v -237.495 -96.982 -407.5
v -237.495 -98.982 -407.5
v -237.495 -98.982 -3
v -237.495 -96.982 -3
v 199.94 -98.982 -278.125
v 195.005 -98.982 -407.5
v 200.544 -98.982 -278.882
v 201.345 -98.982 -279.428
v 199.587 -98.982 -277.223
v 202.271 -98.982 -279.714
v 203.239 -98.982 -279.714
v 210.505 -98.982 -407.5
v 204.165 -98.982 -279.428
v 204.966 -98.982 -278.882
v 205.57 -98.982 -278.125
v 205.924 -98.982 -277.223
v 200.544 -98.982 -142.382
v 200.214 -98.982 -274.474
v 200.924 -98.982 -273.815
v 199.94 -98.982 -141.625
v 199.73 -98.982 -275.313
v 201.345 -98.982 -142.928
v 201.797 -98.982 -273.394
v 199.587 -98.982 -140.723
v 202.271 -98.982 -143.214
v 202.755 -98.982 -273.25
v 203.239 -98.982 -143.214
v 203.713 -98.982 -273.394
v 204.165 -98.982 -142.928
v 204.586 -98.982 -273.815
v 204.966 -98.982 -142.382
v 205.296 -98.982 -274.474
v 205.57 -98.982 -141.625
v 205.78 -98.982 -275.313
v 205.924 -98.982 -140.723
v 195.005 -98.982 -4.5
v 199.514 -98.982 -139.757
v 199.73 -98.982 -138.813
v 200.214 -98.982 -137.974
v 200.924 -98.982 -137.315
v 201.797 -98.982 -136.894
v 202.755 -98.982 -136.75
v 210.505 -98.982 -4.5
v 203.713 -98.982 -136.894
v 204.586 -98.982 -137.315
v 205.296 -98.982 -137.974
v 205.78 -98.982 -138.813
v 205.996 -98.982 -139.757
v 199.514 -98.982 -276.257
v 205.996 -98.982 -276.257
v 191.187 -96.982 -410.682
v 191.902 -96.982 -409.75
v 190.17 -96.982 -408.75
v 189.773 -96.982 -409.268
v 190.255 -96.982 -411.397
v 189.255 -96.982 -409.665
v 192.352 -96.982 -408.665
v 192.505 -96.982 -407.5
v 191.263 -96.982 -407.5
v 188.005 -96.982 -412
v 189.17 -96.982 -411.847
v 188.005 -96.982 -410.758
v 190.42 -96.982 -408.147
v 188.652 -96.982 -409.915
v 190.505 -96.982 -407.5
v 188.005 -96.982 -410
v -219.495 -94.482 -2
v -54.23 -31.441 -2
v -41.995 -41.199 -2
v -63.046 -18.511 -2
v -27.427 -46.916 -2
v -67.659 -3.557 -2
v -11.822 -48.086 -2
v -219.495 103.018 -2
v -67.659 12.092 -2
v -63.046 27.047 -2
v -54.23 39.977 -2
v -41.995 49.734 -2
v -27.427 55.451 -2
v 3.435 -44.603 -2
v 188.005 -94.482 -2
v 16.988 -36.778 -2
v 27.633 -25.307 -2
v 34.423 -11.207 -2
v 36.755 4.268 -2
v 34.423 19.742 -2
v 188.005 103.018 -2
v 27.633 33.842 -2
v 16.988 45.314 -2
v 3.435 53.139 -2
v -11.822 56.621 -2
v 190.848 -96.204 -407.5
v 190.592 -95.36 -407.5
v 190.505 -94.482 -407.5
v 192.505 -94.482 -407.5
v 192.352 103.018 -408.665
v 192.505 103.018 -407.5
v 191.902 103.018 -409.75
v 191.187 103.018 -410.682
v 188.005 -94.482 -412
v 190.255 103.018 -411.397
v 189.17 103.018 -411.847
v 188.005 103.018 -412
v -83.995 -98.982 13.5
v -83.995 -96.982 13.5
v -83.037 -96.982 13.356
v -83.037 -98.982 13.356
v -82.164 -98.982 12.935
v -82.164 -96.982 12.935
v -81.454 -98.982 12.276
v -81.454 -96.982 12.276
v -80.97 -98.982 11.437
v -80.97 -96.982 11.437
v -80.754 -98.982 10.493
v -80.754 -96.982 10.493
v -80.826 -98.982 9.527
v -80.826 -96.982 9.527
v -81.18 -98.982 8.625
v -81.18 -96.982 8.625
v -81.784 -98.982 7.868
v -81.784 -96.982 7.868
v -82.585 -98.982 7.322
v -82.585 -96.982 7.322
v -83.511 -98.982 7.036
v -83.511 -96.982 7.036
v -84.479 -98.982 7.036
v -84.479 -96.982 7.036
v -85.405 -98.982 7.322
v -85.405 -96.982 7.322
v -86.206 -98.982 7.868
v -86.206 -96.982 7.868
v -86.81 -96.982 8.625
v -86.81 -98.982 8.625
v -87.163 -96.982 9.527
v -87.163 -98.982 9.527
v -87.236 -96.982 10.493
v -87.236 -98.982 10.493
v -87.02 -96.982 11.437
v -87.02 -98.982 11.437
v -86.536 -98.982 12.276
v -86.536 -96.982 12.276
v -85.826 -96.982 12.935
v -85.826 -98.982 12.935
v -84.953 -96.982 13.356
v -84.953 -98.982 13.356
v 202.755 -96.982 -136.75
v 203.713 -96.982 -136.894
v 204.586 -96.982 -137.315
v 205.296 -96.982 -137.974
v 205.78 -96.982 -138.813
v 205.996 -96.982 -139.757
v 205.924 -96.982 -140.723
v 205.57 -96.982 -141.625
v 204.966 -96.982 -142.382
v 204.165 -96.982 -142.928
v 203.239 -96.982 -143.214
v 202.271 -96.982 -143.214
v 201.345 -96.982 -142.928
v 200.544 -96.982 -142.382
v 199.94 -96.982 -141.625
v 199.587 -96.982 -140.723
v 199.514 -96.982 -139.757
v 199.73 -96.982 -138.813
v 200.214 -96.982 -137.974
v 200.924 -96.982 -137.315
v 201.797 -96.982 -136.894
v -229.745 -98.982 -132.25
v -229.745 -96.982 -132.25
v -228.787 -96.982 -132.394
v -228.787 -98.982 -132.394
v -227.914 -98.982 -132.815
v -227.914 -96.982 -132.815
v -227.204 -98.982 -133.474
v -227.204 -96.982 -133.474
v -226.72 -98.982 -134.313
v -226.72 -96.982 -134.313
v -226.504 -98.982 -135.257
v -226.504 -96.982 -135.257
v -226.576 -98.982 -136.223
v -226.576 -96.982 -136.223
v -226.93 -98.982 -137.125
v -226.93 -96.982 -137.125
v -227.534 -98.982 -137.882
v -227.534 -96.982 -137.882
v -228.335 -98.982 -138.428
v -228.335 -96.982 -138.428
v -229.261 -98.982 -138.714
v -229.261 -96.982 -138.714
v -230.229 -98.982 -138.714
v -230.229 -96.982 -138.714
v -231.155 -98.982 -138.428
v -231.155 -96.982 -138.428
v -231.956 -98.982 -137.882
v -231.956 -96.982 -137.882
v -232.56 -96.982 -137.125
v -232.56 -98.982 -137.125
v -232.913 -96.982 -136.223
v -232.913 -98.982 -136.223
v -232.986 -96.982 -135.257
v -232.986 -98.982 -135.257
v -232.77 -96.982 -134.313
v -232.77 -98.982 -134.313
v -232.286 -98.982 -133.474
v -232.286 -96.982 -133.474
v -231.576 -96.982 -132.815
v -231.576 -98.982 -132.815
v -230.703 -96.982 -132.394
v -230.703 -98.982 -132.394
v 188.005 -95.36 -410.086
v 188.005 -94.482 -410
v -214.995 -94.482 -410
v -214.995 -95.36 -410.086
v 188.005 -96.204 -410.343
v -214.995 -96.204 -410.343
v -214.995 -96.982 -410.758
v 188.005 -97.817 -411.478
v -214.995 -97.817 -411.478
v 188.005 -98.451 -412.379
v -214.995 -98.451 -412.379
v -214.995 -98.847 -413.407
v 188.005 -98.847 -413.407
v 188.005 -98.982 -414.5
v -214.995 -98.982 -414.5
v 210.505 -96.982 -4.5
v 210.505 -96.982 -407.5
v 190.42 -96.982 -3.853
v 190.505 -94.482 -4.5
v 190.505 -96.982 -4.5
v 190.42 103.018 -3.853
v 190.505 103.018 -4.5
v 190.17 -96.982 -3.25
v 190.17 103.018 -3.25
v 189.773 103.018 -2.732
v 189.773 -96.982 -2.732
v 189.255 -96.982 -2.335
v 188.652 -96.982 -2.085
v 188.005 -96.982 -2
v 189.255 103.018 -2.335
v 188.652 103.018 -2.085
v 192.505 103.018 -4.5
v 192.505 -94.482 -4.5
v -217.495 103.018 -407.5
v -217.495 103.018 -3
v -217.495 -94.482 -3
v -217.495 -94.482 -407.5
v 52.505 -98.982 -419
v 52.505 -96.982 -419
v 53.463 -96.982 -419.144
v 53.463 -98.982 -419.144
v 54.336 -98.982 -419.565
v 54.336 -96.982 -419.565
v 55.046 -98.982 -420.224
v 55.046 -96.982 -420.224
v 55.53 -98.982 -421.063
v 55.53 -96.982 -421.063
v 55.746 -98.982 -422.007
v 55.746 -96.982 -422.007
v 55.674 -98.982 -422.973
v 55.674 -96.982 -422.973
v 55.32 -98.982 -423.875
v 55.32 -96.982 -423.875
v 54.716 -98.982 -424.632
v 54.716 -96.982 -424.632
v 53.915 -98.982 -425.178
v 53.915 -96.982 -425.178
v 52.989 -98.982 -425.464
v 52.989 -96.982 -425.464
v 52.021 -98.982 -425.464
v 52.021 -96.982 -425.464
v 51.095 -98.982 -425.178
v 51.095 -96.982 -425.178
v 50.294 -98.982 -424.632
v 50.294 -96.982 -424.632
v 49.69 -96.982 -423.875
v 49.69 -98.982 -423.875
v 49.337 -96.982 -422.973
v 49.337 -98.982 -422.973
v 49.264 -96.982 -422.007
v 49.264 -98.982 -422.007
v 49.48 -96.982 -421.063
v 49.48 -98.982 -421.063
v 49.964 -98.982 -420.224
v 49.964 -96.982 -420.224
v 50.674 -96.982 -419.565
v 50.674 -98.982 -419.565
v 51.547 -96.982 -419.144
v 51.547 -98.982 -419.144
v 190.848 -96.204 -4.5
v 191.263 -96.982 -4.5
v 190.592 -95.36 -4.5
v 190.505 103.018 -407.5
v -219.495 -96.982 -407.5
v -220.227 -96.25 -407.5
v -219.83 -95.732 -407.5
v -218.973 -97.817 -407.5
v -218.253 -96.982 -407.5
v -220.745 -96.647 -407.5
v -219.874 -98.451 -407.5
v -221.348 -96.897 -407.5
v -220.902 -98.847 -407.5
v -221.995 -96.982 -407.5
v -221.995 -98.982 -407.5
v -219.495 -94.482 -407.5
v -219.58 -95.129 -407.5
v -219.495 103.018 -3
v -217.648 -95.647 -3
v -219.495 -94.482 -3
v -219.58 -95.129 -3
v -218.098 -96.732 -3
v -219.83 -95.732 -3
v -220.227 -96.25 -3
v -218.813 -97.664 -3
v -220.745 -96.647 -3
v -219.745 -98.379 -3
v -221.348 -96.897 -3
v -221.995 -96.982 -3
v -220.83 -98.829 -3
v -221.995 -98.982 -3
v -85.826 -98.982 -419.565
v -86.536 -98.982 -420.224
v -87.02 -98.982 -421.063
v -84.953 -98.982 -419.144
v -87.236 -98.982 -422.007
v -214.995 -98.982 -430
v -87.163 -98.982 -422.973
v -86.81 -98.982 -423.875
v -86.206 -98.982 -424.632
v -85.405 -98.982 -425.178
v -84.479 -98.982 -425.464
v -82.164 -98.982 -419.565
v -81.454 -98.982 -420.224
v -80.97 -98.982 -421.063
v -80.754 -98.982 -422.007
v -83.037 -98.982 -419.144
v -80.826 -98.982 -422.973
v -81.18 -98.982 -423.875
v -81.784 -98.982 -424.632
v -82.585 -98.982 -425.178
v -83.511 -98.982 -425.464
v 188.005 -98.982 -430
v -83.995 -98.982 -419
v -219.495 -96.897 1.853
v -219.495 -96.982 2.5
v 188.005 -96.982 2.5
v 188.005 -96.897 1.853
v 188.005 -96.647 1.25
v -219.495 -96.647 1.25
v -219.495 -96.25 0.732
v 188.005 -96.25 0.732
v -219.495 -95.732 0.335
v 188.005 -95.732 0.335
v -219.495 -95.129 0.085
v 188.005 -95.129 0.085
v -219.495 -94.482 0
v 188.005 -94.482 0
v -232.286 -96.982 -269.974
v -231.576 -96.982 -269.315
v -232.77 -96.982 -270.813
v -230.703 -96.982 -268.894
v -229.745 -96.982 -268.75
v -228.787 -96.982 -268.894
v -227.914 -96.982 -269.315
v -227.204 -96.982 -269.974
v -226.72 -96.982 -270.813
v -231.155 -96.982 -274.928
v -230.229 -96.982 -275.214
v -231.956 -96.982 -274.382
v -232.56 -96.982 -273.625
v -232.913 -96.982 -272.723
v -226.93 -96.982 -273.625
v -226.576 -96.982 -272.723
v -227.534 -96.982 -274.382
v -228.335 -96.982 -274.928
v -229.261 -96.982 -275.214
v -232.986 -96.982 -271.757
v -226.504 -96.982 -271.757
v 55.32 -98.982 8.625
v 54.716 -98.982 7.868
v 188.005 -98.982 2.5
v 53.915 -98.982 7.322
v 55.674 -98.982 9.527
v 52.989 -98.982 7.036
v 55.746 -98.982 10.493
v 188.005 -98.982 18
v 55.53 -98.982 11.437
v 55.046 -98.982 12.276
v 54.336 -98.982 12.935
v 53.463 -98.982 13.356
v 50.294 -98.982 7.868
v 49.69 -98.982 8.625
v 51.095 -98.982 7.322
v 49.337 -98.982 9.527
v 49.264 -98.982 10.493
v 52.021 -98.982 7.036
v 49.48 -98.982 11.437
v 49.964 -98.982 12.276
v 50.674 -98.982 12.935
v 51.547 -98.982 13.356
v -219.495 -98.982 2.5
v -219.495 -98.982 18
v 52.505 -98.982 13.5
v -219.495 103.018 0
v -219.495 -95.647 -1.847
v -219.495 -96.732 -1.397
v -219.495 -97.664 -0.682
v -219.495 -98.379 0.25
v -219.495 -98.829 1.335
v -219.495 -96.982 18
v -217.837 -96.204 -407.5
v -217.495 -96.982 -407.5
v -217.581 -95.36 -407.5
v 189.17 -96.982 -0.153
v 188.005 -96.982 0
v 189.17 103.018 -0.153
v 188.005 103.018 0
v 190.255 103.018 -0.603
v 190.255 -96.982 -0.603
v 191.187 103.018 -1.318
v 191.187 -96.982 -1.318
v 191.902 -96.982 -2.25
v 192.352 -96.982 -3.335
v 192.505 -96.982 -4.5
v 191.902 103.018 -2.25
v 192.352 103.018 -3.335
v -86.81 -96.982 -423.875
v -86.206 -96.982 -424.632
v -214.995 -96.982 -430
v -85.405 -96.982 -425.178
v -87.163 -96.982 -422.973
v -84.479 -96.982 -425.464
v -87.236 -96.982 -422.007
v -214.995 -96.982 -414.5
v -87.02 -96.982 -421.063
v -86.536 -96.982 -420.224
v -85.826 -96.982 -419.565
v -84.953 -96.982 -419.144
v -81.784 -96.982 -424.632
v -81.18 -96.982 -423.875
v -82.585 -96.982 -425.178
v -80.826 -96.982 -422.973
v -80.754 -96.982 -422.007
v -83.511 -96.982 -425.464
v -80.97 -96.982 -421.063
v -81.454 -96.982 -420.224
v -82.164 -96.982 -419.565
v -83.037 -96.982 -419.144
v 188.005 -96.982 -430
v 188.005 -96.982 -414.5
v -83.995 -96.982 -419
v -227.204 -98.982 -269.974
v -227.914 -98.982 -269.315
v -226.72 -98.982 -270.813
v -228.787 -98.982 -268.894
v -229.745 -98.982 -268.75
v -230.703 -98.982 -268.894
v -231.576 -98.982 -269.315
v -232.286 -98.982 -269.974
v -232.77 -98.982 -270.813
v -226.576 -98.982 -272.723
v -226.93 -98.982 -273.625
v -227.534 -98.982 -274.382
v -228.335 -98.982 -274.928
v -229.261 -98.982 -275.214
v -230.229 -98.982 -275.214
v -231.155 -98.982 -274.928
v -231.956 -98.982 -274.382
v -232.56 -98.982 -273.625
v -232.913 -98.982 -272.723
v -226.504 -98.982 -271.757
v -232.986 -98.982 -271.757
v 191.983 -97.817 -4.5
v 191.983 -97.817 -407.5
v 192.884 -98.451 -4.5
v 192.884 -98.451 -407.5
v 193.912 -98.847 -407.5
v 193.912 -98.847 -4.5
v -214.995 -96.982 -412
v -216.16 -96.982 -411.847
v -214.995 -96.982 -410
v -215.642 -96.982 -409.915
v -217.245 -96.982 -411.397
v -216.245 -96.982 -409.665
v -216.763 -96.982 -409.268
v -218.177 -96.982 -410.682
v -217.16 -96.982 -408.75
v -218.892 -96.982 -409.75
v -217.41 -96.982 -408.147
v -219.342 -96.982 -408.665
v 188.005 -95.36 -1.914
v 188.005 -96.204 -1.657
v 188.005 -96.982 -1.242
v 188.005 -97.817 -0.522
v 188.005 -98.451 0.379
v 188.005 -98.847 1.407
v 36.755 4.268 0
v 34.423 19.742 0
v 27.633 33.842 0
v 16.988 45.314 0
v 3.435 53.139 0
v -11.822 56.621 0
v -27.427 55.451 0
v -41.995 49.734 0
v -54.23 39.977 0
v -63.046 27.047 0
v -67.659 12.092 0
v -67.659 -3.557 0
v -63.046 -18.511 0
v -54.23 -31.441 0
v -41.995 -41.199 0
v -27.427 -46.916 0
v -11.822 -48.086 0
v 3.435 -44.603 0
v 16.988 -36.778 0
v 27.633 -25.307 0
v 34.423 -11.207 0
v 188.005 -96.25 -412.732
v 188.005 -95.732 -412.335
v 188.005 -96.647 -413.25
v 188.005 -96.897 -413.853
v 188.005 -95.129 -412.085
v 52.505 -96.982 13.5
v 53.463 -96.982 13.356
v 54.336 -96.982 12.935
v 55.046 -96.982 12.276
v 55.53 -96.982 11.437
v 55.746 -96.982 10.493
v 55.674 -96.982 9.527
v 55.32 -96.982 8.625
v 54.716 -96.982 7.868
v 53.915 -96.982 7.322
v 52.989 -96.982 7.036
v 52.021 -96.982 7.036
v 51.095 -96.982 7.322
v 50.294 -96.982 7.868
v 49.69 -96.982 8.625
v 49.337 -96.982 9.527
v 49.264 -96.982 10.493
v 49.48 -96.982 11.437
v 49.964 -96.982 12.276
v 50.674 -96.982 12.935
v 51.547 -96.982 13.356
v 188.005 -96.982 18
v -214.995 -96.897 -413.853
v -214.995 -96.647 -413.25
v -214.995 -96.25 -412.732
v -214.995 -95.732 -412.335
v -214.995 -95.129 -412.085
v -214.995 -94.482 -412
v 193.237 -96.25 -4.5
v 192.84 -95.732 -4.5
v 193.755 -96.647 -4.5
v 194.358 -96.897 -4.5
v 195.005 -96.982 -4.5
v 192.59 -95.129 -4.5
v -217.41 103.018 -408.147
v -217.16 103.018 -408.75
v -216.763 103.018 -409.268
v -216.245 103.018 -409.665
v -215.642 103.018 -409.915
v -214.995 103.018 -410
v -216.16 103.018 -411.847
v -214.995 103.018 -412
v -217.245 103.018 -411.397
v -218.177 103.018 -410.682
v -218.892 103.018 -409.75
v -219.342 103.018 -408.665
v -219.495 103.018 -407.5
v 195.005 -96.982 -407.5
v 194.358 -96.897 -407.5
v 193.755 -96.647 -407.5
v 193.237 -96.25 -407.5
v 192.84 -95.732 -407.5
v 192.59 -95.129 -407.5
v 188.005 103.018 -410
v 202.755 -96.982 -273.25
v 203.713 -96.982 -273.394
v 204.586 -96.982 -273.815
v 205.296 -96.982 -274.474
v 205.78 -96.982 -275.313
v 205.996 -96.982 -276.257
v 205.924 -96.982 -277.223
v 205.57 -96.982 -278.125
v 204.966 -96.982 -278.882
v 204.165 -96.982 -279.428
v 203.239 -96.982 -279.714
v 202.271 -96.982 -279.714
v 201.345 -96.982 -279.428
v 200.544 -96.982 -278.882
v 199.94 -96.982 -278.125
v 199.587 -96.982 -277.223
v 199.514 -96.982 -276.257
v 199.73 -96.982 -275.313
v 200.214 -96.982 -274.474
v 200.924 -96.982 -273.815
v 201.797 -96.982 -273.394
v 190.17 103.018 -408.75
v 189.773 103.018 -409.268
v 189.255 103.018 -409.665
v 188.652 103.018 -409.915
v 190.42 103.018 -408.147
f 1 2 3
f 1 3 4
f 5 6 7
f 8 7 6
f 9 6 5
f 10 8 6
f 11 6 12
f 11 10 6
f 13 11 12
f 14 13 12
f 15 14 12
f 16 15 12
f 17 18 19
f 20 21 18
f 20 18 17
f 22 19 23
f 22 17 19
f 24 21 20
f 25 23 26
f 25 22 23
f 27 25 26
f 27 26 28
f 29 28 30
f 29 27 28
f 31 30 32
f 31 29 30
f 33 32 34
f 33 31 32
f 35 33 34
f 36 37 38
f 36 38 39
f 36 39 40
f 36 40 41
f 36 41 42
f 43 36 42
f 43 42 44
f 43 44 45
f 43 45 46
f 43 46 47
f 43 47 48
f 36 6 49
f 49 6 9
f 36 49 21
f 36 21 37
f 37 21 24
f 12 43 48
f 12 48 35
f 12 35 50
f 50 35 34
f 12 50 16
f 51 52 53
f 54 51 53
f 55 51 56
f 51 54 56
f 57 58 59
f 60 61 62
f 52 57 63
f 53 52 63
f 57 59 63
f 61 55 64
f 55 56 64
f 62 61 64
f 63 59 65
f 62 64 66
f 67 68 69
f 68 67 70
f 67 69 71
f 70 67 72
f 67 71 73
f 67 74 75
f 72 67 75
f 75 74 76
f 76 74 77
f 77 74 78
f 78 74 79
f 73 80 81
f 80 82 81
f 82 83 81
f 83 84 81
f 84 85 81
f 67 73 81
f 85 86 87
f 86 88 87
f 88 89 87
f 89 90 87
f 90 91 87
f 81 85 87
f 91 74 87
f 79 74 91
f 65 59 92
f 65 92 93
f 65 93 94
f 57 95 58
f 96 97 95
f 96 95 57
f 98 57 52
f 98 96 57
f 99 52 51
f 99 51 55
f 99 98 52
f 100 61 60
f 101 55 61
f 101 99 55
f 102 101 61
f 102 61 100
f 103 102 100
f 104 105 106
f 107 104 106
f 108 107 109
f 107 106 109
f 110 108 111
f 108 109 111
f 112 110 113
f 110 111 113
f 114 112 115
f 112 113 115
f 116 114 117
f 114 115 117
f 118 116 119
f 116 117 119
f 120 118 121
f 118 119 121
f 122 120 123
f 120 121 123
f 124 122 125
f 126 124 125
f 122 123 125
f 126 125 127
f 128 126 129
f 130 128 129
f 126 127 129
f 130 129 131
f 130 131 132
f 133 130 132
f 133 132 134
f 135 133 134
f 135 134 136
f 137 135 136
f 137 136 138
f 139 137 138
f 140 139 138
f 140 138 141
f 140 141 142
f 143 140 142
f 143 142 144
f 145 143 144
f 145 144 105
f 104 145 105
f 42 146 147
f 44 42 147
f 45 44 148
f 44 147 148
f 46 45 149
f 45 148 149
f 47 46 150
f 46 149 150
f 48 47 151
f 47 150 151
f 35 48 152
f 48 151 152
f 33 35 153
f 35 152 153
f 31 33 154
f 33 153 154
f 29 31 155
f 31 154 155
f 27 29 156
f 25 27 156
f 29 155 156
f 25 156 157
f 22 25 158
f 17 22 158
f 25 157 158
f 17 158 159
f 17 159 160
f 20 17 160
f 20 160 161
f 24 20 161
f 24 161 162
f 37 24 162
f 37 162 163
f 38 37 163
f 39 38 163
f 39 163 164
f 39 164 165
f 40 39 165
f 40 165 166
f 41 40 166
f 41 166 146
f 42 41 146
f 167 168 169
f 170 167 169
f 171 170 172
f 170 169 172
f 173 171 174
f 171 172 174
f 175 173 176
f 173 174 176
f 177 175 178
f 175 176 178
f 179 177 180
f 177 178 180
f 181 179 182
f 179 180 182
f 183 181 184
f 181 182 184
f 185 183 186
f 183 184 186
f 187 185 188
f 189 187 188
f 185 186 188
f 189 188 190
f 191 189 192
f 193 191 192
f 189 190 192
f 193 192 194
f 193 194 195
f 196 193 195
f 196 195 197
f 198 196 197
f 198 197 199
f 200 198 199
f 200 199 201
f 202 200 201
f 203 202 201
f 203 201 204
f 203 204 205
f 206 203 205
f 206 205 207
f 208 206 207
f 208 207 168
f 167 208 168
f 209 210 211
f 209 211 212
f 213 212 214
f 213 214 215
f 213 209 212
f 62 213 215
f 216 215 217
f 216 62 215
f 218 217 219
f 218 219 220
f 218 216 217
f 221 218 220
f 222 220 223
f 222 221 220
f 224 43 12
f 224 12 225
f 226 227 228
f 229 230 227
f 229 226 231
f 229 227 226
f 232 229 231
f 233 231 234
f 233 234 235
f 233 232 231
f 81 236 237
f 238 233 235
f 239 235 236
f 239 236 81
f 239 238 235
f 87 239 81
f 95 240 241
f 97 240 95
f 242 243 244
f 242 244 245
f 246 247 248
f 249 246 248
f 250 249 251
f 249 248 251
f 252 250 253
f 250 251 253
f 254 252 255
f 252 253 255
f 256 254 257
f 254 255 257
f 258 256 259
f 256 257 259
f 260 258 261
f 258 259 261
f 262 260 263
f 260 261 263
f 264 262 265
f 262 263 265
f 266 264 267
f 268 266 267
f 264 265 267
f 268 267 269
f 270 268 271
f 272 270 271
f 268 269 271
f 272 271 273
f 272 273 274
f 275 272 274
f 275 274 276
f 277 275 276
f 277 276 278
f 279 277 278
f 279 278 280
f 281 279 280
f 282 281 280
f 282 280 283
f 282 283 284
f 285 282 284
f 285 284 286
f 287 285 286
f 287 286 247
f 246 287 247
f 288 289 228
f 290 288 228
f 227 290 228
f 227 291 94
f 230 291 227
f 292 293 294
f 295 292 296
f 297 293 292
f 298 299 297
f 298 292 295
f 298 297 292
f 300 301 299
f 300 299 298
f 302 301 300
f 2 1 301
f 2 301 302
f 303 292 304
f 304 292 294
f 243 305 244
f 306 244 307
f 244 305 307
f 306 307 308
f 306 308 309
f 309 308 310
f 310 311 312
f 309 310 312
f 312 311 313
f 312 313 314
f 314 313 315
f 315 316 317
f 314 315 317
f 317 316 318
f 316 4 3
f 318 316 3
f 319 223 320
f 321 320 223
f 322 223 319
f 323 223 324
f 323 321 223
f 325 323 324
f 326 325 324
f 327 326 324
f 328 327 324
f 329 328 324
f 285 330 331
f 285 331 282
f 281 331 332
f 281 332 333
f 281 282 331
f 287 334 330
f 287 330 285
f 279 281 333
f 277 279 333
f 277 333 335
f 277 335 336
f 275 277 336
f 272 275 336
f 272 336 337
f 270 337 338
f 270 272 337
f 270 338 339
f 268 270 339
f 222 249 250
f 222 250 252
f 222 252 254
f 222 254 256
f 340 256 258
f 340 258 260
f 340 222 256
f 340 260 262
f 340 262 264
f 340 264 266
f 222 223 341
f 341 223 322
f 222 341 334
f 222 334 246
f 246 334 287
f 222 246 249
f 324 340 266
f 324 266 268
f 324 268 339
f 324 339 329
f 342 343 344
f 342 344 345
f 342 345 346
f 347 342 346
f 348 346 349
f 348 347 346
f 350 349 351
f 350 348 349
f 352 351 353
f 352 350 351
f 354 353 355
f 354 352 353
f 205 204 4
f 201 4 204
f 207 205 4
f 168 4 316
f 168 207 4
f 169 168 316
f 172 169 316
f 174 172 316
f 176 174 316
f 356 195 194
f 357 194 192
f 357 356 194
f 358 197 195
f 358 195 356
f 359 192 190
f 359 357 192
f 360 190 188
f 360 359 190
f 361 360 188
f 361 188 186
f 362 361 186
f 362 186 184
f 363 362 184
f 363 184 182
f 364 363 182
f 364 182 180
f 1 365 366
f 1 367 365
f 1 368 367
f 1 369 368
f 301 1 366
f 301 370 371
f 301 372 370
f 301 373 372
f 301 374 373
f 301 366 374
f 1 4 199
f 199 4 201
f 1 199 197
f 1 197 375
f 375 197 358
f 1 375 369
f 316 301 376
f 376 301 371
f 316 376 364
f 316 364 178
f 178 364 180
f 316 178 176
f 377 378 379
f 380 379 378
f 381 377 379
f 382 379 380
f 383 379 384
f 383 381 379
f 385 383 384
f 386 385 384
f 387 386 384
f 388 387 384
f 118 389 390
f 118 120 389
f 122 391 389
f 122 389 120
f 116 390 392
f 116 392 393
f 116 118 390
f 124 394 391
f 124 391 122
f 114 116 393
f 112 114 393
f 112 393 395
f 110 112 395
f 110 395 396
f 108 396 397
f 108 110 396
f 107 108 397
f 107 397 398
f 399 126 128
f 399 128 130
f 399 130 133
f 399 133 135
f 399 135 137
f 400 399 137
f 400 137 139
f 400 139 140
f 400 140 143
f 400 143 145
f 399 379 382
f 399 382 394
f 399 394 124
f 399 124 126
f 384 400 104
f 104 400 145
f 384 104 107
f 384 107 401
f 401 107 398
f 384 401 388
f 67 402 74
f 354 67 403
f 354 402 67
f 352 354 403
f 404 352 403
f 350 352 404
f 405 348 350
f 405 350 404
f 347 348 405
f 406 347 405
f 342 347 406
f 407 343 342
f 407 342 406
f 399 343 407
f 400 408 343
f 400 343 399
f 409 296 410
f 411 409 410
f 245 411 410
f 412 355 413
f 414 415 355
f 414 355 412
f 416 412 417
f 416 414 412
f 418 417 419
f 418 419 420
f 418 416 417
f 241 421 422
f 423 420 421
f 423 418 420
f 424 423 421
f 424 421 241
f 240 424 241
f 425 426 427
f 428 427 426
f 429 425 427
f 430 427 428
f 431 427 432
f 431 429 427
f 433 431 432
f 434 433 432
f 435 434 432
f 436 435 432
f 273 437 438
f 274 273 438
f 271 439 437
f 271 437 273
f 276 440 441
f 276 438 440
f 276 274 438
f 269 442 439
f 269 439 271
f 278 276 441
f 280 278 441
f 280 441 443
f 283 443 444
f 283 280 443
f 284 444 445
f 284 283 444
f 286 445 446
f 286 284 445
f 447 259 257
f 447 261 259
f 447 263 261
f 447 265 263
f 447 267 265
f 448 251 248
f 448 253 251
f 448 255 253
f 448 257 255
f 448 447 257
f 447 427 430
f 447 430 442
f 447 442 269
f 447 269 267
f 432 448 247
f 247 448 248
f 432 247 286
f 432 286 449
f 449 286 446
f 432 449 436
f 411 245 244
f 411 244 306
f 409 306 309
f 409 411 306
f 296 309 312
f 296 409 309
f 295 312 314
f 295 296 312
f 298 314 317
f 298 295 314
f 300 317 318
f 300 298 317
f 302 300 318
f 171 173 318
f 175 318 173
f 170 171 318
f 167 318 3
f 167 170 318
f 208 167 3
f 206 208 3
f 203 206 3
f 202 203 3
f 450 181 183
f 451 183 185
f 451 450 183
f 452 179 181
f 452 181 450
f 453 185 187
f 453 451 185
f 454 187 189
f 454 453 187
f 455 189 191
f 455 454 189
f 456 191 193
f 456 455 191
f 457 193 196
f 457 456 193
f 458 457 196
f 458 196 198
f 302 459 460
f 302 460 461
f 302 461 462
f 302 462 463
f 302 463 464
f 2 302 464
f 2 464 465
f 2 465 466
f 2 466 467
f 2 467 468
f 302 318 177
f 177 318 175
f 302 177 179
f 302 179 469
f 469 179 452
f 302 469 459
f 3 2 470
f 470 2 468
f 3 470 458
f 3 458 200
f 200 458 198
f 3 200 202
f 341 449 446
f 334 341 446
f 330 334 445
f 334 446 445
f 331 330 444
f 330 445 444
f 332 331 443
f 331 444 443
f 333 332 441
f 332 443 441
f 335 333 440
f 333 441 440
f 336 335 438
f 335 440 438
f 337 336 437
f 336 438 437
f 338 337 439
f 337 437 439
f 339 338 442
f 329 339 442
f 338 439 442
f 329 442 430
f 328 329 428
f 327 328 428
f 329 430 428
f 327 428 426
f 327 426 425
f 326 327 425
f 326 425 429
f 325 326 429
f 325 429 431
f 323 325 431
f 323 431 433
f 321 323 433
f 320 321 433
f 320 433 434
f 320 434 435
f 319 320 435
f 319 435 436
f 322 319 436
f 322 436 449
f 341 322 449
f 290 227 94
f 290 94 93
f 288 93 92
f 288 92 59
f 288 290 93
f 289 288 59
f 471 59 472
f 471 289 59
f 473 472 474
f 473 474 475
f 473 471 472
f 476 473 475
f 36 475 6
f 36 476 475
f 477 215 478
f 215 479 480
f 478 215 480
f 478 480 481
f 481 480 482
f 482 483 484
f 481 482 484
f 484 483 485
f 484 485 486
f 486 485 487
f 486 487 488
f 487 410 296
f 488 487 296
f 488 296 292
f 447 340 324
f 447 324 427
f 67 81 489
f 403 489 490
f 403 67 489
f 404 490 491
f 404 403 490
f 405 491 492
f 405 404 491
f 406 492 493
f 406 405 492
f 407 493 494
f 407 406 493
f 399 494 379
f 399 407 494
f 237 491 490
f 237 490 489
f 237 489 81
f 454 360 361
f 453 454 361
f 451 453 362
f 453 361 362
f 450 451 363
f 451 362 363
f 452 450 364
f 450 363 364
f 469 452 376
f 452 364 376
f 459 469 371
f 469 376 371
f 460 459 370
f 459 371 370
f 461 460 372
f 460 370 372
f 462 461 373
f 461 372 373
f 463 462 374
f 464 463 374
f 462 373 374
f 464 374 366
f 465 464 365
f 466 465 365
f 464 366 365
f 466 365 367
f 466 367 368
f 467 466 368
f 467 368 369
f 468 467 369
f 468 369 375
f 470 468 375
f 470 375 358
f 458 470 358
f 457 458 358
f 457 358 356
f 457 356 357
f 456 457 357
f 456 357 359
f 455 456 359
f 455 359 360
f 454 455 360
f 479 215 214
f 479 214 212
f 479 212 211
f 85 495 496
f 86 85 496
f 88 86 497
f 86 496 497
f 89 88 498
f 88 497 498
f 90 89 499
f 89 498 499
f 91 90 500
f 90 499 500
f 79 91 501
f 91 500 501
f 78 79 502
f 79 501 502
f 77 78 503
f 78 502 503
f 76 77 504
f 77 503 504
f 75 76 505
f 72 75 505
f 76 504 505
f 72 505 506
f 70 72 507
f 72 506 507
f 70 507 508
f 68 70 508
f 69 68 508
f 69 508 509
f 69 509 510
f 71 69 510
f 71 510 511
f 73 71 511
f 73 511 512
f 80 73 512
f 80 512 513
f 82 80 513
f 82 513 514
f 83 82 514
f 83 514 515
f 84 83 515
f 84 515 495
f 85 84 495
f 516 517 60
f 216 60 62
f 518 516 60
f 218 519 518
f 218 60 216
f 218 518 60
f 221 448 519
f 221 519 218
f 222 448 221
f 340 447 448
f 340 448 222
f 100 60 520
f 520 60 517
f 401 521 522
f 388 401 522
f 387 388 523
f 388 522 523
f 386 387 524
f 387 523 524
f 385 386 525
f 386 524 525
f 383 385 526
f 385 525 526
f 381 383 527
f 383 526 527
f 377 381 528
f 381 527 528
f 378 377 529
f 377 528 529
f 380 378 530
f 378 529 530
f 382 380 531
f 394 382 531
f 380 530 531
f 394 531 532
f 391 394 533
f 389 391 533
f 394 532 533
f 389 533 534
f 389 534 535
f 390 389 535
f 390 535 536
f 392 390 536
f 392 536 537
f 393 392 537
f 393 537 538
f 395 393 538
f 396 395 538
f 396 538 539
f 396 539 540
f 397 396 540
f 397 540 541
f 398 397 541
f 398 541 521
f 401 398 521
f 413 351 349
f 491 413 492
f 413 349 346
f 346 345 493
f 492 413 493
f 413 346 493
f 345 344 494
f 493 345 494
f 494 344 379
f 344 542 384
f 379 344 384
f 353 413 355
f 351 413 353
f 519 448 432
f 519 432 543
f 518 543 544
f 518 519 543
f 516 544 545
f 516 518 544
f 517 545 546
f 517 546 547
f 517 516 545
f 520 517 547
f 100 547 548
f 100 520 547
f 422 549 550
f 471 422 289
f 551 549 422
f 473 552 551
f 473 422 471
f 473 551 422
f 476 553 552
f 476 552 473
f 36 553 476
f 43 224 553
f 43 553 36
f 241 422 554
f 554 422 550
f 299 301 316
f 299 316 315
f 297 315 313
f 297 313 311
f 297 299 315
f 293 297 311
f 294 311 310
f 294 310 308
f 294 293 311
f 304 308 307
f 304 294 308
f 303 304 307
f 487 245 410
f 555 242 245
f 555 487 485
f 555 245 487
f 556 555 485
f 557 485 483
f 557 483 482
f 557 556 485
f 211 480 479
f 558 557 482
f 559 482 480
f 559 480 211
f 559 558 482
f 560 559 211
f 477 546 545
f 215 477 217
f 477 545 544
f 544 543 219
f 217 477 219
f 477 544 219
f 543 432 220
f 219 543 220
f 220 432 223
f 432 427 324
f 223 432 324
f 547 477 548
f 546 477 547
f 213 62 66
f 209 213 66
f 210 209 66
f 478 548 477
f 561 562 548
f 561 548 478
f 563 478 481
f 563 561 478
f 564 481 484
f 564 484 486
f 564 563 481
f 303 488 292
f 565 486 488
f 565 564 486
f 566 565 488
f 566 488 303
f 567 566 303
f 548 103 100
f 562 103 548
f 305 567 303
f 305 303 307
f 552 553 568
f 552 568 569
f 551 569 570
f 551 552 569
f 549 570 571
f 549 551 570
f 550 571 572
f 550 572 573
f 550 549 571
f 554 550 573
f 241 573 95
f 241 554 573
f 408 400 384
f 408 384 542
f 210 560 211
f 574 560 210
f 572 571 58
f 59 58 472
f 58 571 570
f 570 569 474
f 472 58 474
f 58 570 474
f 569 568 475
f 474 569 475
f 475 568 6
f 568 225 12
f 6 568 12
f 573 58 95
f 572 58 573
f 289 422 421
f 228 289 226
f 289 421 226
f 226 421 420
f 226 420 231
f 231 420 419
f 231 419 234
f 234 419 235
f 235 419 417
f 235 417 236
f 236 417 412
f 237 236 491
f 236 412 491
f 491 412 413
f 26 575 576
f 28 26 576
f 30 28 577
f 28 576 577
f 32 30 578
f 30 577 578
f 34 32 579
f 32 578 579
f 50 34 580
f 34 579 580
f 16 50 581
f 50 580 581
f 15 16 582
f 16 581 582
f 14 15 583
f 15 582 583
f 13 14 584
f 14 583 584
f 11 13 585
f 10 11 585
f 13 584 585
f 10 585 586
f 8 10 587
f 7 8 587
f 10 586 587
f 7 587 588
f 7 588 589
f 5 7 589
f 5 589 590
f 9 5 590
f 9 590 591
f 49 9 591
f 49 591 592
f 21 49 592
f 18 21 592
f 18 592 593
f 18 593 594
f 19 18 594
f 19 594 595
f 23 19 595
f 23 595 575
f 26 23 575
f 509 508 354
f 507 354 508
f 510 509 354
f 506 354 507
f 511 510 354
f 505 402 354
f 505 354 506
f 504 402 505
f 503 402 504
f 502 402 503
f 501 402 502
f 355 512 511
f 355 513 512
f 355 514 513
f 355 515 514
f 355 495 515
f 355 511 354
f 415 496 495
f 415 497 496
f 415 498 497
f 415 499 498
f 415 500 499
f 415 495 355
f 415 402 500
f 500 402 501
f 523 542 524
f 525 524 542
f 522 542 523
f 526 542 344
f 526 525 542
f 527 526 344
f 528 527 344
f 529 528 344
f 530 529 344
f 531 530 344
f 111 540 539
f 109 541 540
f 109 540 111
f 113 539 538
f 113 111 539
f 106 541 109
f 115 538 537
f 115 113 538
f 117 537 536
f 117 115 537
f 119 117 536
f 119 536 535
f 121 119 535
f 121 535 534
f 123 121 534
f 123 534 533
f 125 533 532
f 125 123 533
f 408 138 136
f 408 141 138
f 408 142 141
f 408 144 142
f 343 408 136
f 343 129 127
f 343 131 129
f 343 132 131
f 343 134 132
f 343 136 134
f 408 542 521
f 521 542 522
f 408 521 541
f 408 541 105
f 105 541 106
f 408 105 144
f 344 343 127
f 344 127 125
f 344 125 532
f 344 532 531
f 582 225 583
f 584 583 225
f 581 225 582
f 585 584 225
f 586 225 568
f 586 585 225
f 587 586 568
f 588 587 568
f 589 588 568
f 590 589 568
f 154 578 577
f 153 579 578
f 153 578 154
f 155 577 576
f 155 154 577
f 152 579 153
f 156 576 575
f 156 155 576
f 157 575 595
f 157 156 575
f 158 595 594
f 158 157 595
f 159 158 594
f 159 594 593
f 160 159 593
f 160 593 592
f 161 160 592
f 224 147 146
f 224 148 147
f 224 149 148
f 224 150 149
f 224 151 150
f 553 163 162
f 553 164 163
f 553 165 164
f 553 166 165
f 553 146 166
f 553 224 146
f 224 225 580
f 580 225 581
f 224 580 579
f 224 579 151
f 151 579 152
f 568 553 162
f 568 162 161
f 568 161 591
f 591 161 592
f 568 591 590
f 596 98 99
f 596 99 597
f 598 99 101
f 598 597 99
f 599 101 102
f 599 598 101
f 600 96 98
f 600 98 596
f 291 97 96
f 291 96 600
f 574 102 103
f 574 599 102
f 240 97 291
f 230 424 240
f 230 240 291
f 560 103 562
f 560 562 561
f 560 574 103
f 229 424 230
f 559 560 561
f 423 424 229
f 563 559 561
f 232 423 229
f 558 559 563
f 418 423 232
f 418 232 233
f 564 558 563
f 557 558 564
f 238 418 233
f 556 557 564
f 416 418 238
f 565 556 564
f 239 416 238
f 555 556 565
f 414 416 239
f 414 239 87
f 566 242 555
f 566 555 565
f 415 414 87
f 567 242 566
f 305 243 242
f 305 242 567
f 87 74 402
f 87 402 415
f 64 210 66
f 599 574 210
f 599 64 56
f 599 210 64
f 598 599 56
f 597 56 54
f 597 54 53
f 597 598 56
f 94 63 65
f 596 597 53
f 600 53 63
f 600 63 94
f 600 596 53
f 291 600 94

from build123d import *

# Parameters (mm, degrees)
SKETCH1_W                    = 410
SKETCH1_H                    = 200
BASE_FLANGE1_DEPTH           = 2
EDGE_FLANGE2_STRIP_W         = 13
EDGE_FLANGE2_STRIP_H         = 2
EDGE_FLANGE2_STRIP_CUT_DEPTH = 200
EDGE_FLANGE2_DEPTH           = 200
EDGE_FLANGE4_STRIP_W         = 13
EDGE_FLANGE4_STRIP_H         = 2
EDGE_FLANGE4_STRIP_CUT_DEPTH = 200
EDGE_FLANGE4_DEPTH           = 200
EDGE_FLANGE5_STRIP_W         = 13
EDGE_FLANGE5_STRIP_H         = 2
EDGE_FLANGE5_STRIP_CUT_DEPTH = 200
EDGE_FLANGE5_DEPTH           = 200
EDGE_FLANGE6_STRIP_W         = 13
EDGE_FLANGE6_STRIP_H         = 2
EDGE_FLANGE6_STRIP_CUT_DEPTH = 403
EDGE_FLANGE6_DEPTH           = 403
EDGE_FLANGE7_STRIP_W         = 13
EDGE_FLANGE7_STRIP_H         = 2
EDGE_FLANGE7_STRIP_CUT_DEPTH = 403
EDGE_FLANGE7_DEPTH           = 403
EDGE_FLANGE8_STRIP_W         = 13
EDGE_FLANGE8_STRIP_H         = 2
EDGE_FLANGE8_STRIP_CUT_DEPTH = 407.5
EDGE_FLANGE8_DEPTH           = 407.5
EDGE_FLANGE9_STRIP_W         = 13
EDGE_FLANGE9_STRIP_H         = 2
EDGE_FLANGE9_STRIP_CUT_DEPTH = 404.5
EDGE_FLANGE9_DEPTH           = 404.5
SKETCH29_R                   = 52.5
CUT_EXTRUDE1_DEPTH           = 10
SKETCH30_R                   = 3.25
CUT_EXTRUDE2_DEPTH           = 10


# Sheet-metal steps are written as plain solids
with BuildPart() as part:
    # Sketch1 → Base-Flange1 (new body)
    with BuildSketch(Plane.XY):
        with Locations((-14.494949495, 3.017676768)):
            Rectangle(SKETCH1_W, SKETCH1_H)
    extrude(amount=-BASE_FLANGE1_DEPTH)

    # Edge-Flange2 strip (across the edge) → Edge-Flange2 strip cut (cut)
    with BuildSketch(Plane(origin=(190.505050505, 103.017676768, -2), x_dir=(-1, 0, 0), z_dir=(0, -1, 0))):
        with Locations((-4, -1)):
            Rectangle(EDGE_FLANGE2_STRIP_W, EDGE_FLANGE2_STRIP_H)
    extrude(amount=EDGE_FLANGE2_STRIP_CUT_DEPTH, mode=Mode.SUBTRACT)

    # Edge-Flange2 section (across the edge) → Edge-Flange2 (add)
    with BuildSketch(Plane(origin=(190.505050505, 103.017676768, -2), x_dir=(-1, 0, 0), z_dir=(0, -1, 0))):
        with BuildLine():
            Line((-2, 2.5), (-2, 408))
            Line((-2, 408), (0, 408))
            Line((0, 408), (0, 2.5))
            ThreePointArc((0, 2.5), (0.732233047, 0.732233047), (2.5, 0))
            Line((2.5, 0), (2.5, -2))
            ThreePointArc((2.5, -2), (-0.681980515, -0.681980515), (-2, 2.5))
        make_face()
    extrude(amount=EDGE_FLANGE2_DEPTH)

    # Edge-Flange4 strip (across the edge) → Edge-Flange4 strip cut (cut)
    with BuildSketch(Plane(origin=(190.505050505, 103.017676768, -410), x_dir=(0, 0, 1), z_dir=(0, -1, 0))):
        with Locations((-4, -1)):
            Rectangle(EDGE_FLANGE4_STRIP_W, EDGE_FLANGE4_STRIP_H)
    extrude(amount=EDGE_FLANGE4_STRIP_CUT_DEPTH, mode=Mode.SUBTRACT)

    # Edge-Flange4 section (across the edge) → Edge-Flange4 (add)
    with BuildSketch(Plane(origin=(190.505050505, 103.017676768, -410), x_dir=(0, 0, 1), z_dir=(0, -1, 0))):
        with BuildLine():
            Line((-2, 2.5), (-2, 408))
            Line((-2, 408), (0, 408))
            Line((0, 408), (0, 2.5))
            ThreePointArc((0, 2.5), (0.732233047, 0.732233047), (2.5, 0))
            Line((2.5, 0), (2.5, -2))
            ThreePointArc((2.5, -2), (-0.681980515, -0.681980515), (-2, 2.5))
        make_face()
    extrude(amount=EDGE_FLANGE4_DEPTH)

    # Edge-Flange5 strip (across the edge) → Edge-Flange5 strip cut (cut)
    with BuildSketch(Plane(origin=(-217.494949495, 103.017676768, -410), x_dir=(1, 0, 0), z_dir=(0, -1, 0))):
        with Locations((-4, -1)):
            Rectangle(EDGE_FLANGE5_STRIP_W, EDGE_FLANGE5_STRIP_H)
    extrude(amount=EDGE_FLANGE5_STRIP_CUT_DEPTH, mode=Mode.SUBTRACT)

    # Edge-Flange5 section (across the edge) → Edge-Flange5 (add)
    with BuildSketch(Plane(origin=(-217.494949495, 103.017676768, -410), x_dir=(1, 0, 0), z_dir=(0, -1, 0))):
        with BuildLine():
            Line((-2, 2.5), (-2, 407))
            Line((-2, 407), (0, 407))
            Line((0, 407), (0, 2.5))
            ThreePointArc((0, 2.5), (0.732233047, 0.732233047), (2.5, 0))
            Line((2.5, 0), (2.5, -2))
            ThreePointArc((2.5, -2), (-0.681980515, -0.681980515), (-2, 2.5))
        make_face()
    extrude(amount=EDGE_FLANGE5_DEPTH)

    # Edge-Flange6 strip (across the edge) → Edge-Flange6 strip cut (cut)
    with BuildSketch(Plane(origin=(188.005050505, -96.982323232, -412), x_dir=(0, 1, 0), z_dir=(-1, 0, 0))):
        with Locations((-4, -1)):
            Rectangle(EDGE_FLANGE6_STRIP_W, EDGE_FLANGE6_STRIP_H)
    extrude(amount=EDGE_FLANGE6_STRIP_CUT_DEPTH, mode=Mode.SUBTRACT)

    # Edge-Flange6 section (across the edge) → Edge-Flange6 (add)
    with BuildSketch(Plane(origin=(188.005050505, -96.982323232, -412), x_dir=(0, 1, 0), z_dir=(-1, 0, 0))):
        with BuildLine():
            Line((-2, 2.5), (-2, 18))
            Line((-2, 18), (0, 18))
            Line((0, 18), (0, 2.5))
            ThreePointArc((0, 2.5), (0.732233047, 0.732233047), (2.5, 0))
            Line((2.5, 0), (2.5, -2))
            ThreePointArc((2.5, -2), (-0.681980515, -0.681980515), (-2, 2.5))
        make_face()
    extrude(amount=EDGE_FLANGE6_DEPTH)

    # Edge-Flange7 strip (across the edge) → Edge-Flange7 strip cut (cut)
    with BuildSketch(Plane(origin=(192.505050505, -96.982323232, -4.5), x_dir=(0, 1, 0), z_dir=(0, 0, -1))):
        with Locations((-4, -1)):
            Rectangle(EDGE_FLANGE7_STRIP_W, EDGE_FLANGE7_STRIP_H)
    extrude(amount=EDGE_FLANGE7_STRIP_CUT_DEPTH, mode=Mode.SUBTRACT)

    # Edge-Flange7 section (across the edge) → Edge-Flange7 (add)
    with BuildSketch(Plane(origin=(192.505050505, -96.982323232, -4.5), x_dir=(0, 1, 0), z_dir=(0, 0, -1))):
        with BuildLine():
            Line((-2, 2.5), (-2, 18))
            Line((-2, 18), (0, 18))
            Line((0, 18), (0, 2.5))
            ThreePointArc((0, 2.5), (0.732233047, 0.732233047), (2.5, 0))
            Line((2.5, 0), (2.5, -2))
            ThreePointArc((2.5, -2), (-0.681980515, -0.681980515), (-2, 2.5))
        make_face()
    extrude(amount=EDGE_FLANGE7_DEPTH)

    # Edge-Flange8 strip (across the edge) → Edge-Flange8 strip cut (cut)
    with BuildSketch(Plane(origin=(-219.494949495, -96.982323232, 0), x_dir=(0, 1, 0), z_dir=(1, 0, 0))):
        with Locations((-4, -1)):
            Rectangle(EDGE_FLANGE8_STRIP_W, EDGE_FLANGE8_STRIP_H)
    extrude(amount=EDGE_FLANGE8_STRIP_CUT_DEPTH, mode=Mode.SUBTRACT)

    # Edge-Flange8 section (across the edge) → Edge-Flange8 (add)
    with BuildSketch(Plane(origin=(-219.494949495, -96.982323232, 0), x_dir=(0, 1, 0), z_dir=(1, 0, 0))):
        with BuildLine():
            Line((-2, 2.5), (-2, 18))
            Line((-2, 18), (0, 18))
            Line((0, 18), (0, 2.5))
            ThreePointArc((0, 2.5), (0.732233047, 0.732233047), (2.5, 0))
            Line((2.5, 0), (2.5, -2))
            ThreePointArc((2.5, -2), (-0.681980515, -0.681980515), (-2, 2.5))
        make_face()
    extrude(amount=EDGE_FLANGE8_DEPTH)

    # Edge-Flange9 strip (across the edge) → Edge-Flange9 strip cut (cut)
    with BuildSketch(Plane(origin=(-219.494949495, -96.982323232, -407.5), x_dir=(0, 1, 0), z_dir=(0, 0, 1))):
        with Locations((-4, -1)):
            Rectangle(EDGE_FLANGE9_STRIP_W, EDGE_FLANGE9_STRIP_H)
    extrude(amount=EDGE_FLANGE9_STRIP_CUT_DEPTH, mode=Mode.SUBTRACT)

    # Edge-Flange9 section (across the edge) → Edge-Flange9 (add)
    with BuildSketch(Plane(origin=(-219.494949495, -96.982323232, -407.5), x_dir=(0, 1, 0), z_dir=(0, 0, 1))):
        with BuildLine():
            Line((-2, 2.5), (-2, 18))
            Line((-2, 18), (0, 18))
            Line((0, 18), (0, 2.5))
            ThreePointArc((0, 2.5), (0.732233047, 0.732233047), (2.5, 0))
            Line((2.5, 0), (2.5, -2))
            ThreePointArc((2.5, -2), (-0.681980515, -0.681980515), (-2, 2.5))
        make_face()
    extrude(amount=EDGE_FLANGE9_DEPTH)

    # Sketch29 → Cut-Extrude1 (cut)
    with BuildSketch(Plane.XY):
        with Locations((-15.744949495, 4.267676768)):
            Circle(SKETCH29_R)
    extrude(amount=-CUT_EXTRUDE1_DEPTH, mode=Mode.SUBTRACT)

    # Sketch30 → Cut-Extrude2 (cut)
    with BuildSketch(Plane(origin=(0, -96.982323232, 0), x_dir=(1, 0, 0), z_dir=(0, 1, 0))):
        with Locations(Location((-83.994949495, -10.25, 0), (0, 0, 270))):
            Circle(SKETCH30_R)
        with Locations(Location((52.505050505, -10.25, 0), (0, 0, 270))):
            Circle(SKETCH30_R)
        with Locations(Location((202.755050505, 140, 0), (0, 0, 270))):
            Circle(SKETCH30_R)
        with Locations(Location((202.755050505, 276.5, 0), (0, 0, 270))):
            Circle(SKETCH30_R)
        with Locations(Location((52.505050505, 422.25, 0), (0, 0, 270))):
            Circle(SKETCH30_R)
        with Locations(Location((-83.994949495, 422.25, 0), (0, 0, 270))):
            Circle(SKETCH30_R)
        with Locations(Location((-229.744949495, 272, 0), (0, 0, 270))):
            Circle(SKETCH30_R)
        with Locations(Location((-229.744949495, 135.5, 0), (0, 0, 270))):
            Circle(SKETCH30_R)
    extrude(amount=-CUT_EXTRUDE2_DEPTH, mode=Mode.SUBTRACT)


solid = part.part
